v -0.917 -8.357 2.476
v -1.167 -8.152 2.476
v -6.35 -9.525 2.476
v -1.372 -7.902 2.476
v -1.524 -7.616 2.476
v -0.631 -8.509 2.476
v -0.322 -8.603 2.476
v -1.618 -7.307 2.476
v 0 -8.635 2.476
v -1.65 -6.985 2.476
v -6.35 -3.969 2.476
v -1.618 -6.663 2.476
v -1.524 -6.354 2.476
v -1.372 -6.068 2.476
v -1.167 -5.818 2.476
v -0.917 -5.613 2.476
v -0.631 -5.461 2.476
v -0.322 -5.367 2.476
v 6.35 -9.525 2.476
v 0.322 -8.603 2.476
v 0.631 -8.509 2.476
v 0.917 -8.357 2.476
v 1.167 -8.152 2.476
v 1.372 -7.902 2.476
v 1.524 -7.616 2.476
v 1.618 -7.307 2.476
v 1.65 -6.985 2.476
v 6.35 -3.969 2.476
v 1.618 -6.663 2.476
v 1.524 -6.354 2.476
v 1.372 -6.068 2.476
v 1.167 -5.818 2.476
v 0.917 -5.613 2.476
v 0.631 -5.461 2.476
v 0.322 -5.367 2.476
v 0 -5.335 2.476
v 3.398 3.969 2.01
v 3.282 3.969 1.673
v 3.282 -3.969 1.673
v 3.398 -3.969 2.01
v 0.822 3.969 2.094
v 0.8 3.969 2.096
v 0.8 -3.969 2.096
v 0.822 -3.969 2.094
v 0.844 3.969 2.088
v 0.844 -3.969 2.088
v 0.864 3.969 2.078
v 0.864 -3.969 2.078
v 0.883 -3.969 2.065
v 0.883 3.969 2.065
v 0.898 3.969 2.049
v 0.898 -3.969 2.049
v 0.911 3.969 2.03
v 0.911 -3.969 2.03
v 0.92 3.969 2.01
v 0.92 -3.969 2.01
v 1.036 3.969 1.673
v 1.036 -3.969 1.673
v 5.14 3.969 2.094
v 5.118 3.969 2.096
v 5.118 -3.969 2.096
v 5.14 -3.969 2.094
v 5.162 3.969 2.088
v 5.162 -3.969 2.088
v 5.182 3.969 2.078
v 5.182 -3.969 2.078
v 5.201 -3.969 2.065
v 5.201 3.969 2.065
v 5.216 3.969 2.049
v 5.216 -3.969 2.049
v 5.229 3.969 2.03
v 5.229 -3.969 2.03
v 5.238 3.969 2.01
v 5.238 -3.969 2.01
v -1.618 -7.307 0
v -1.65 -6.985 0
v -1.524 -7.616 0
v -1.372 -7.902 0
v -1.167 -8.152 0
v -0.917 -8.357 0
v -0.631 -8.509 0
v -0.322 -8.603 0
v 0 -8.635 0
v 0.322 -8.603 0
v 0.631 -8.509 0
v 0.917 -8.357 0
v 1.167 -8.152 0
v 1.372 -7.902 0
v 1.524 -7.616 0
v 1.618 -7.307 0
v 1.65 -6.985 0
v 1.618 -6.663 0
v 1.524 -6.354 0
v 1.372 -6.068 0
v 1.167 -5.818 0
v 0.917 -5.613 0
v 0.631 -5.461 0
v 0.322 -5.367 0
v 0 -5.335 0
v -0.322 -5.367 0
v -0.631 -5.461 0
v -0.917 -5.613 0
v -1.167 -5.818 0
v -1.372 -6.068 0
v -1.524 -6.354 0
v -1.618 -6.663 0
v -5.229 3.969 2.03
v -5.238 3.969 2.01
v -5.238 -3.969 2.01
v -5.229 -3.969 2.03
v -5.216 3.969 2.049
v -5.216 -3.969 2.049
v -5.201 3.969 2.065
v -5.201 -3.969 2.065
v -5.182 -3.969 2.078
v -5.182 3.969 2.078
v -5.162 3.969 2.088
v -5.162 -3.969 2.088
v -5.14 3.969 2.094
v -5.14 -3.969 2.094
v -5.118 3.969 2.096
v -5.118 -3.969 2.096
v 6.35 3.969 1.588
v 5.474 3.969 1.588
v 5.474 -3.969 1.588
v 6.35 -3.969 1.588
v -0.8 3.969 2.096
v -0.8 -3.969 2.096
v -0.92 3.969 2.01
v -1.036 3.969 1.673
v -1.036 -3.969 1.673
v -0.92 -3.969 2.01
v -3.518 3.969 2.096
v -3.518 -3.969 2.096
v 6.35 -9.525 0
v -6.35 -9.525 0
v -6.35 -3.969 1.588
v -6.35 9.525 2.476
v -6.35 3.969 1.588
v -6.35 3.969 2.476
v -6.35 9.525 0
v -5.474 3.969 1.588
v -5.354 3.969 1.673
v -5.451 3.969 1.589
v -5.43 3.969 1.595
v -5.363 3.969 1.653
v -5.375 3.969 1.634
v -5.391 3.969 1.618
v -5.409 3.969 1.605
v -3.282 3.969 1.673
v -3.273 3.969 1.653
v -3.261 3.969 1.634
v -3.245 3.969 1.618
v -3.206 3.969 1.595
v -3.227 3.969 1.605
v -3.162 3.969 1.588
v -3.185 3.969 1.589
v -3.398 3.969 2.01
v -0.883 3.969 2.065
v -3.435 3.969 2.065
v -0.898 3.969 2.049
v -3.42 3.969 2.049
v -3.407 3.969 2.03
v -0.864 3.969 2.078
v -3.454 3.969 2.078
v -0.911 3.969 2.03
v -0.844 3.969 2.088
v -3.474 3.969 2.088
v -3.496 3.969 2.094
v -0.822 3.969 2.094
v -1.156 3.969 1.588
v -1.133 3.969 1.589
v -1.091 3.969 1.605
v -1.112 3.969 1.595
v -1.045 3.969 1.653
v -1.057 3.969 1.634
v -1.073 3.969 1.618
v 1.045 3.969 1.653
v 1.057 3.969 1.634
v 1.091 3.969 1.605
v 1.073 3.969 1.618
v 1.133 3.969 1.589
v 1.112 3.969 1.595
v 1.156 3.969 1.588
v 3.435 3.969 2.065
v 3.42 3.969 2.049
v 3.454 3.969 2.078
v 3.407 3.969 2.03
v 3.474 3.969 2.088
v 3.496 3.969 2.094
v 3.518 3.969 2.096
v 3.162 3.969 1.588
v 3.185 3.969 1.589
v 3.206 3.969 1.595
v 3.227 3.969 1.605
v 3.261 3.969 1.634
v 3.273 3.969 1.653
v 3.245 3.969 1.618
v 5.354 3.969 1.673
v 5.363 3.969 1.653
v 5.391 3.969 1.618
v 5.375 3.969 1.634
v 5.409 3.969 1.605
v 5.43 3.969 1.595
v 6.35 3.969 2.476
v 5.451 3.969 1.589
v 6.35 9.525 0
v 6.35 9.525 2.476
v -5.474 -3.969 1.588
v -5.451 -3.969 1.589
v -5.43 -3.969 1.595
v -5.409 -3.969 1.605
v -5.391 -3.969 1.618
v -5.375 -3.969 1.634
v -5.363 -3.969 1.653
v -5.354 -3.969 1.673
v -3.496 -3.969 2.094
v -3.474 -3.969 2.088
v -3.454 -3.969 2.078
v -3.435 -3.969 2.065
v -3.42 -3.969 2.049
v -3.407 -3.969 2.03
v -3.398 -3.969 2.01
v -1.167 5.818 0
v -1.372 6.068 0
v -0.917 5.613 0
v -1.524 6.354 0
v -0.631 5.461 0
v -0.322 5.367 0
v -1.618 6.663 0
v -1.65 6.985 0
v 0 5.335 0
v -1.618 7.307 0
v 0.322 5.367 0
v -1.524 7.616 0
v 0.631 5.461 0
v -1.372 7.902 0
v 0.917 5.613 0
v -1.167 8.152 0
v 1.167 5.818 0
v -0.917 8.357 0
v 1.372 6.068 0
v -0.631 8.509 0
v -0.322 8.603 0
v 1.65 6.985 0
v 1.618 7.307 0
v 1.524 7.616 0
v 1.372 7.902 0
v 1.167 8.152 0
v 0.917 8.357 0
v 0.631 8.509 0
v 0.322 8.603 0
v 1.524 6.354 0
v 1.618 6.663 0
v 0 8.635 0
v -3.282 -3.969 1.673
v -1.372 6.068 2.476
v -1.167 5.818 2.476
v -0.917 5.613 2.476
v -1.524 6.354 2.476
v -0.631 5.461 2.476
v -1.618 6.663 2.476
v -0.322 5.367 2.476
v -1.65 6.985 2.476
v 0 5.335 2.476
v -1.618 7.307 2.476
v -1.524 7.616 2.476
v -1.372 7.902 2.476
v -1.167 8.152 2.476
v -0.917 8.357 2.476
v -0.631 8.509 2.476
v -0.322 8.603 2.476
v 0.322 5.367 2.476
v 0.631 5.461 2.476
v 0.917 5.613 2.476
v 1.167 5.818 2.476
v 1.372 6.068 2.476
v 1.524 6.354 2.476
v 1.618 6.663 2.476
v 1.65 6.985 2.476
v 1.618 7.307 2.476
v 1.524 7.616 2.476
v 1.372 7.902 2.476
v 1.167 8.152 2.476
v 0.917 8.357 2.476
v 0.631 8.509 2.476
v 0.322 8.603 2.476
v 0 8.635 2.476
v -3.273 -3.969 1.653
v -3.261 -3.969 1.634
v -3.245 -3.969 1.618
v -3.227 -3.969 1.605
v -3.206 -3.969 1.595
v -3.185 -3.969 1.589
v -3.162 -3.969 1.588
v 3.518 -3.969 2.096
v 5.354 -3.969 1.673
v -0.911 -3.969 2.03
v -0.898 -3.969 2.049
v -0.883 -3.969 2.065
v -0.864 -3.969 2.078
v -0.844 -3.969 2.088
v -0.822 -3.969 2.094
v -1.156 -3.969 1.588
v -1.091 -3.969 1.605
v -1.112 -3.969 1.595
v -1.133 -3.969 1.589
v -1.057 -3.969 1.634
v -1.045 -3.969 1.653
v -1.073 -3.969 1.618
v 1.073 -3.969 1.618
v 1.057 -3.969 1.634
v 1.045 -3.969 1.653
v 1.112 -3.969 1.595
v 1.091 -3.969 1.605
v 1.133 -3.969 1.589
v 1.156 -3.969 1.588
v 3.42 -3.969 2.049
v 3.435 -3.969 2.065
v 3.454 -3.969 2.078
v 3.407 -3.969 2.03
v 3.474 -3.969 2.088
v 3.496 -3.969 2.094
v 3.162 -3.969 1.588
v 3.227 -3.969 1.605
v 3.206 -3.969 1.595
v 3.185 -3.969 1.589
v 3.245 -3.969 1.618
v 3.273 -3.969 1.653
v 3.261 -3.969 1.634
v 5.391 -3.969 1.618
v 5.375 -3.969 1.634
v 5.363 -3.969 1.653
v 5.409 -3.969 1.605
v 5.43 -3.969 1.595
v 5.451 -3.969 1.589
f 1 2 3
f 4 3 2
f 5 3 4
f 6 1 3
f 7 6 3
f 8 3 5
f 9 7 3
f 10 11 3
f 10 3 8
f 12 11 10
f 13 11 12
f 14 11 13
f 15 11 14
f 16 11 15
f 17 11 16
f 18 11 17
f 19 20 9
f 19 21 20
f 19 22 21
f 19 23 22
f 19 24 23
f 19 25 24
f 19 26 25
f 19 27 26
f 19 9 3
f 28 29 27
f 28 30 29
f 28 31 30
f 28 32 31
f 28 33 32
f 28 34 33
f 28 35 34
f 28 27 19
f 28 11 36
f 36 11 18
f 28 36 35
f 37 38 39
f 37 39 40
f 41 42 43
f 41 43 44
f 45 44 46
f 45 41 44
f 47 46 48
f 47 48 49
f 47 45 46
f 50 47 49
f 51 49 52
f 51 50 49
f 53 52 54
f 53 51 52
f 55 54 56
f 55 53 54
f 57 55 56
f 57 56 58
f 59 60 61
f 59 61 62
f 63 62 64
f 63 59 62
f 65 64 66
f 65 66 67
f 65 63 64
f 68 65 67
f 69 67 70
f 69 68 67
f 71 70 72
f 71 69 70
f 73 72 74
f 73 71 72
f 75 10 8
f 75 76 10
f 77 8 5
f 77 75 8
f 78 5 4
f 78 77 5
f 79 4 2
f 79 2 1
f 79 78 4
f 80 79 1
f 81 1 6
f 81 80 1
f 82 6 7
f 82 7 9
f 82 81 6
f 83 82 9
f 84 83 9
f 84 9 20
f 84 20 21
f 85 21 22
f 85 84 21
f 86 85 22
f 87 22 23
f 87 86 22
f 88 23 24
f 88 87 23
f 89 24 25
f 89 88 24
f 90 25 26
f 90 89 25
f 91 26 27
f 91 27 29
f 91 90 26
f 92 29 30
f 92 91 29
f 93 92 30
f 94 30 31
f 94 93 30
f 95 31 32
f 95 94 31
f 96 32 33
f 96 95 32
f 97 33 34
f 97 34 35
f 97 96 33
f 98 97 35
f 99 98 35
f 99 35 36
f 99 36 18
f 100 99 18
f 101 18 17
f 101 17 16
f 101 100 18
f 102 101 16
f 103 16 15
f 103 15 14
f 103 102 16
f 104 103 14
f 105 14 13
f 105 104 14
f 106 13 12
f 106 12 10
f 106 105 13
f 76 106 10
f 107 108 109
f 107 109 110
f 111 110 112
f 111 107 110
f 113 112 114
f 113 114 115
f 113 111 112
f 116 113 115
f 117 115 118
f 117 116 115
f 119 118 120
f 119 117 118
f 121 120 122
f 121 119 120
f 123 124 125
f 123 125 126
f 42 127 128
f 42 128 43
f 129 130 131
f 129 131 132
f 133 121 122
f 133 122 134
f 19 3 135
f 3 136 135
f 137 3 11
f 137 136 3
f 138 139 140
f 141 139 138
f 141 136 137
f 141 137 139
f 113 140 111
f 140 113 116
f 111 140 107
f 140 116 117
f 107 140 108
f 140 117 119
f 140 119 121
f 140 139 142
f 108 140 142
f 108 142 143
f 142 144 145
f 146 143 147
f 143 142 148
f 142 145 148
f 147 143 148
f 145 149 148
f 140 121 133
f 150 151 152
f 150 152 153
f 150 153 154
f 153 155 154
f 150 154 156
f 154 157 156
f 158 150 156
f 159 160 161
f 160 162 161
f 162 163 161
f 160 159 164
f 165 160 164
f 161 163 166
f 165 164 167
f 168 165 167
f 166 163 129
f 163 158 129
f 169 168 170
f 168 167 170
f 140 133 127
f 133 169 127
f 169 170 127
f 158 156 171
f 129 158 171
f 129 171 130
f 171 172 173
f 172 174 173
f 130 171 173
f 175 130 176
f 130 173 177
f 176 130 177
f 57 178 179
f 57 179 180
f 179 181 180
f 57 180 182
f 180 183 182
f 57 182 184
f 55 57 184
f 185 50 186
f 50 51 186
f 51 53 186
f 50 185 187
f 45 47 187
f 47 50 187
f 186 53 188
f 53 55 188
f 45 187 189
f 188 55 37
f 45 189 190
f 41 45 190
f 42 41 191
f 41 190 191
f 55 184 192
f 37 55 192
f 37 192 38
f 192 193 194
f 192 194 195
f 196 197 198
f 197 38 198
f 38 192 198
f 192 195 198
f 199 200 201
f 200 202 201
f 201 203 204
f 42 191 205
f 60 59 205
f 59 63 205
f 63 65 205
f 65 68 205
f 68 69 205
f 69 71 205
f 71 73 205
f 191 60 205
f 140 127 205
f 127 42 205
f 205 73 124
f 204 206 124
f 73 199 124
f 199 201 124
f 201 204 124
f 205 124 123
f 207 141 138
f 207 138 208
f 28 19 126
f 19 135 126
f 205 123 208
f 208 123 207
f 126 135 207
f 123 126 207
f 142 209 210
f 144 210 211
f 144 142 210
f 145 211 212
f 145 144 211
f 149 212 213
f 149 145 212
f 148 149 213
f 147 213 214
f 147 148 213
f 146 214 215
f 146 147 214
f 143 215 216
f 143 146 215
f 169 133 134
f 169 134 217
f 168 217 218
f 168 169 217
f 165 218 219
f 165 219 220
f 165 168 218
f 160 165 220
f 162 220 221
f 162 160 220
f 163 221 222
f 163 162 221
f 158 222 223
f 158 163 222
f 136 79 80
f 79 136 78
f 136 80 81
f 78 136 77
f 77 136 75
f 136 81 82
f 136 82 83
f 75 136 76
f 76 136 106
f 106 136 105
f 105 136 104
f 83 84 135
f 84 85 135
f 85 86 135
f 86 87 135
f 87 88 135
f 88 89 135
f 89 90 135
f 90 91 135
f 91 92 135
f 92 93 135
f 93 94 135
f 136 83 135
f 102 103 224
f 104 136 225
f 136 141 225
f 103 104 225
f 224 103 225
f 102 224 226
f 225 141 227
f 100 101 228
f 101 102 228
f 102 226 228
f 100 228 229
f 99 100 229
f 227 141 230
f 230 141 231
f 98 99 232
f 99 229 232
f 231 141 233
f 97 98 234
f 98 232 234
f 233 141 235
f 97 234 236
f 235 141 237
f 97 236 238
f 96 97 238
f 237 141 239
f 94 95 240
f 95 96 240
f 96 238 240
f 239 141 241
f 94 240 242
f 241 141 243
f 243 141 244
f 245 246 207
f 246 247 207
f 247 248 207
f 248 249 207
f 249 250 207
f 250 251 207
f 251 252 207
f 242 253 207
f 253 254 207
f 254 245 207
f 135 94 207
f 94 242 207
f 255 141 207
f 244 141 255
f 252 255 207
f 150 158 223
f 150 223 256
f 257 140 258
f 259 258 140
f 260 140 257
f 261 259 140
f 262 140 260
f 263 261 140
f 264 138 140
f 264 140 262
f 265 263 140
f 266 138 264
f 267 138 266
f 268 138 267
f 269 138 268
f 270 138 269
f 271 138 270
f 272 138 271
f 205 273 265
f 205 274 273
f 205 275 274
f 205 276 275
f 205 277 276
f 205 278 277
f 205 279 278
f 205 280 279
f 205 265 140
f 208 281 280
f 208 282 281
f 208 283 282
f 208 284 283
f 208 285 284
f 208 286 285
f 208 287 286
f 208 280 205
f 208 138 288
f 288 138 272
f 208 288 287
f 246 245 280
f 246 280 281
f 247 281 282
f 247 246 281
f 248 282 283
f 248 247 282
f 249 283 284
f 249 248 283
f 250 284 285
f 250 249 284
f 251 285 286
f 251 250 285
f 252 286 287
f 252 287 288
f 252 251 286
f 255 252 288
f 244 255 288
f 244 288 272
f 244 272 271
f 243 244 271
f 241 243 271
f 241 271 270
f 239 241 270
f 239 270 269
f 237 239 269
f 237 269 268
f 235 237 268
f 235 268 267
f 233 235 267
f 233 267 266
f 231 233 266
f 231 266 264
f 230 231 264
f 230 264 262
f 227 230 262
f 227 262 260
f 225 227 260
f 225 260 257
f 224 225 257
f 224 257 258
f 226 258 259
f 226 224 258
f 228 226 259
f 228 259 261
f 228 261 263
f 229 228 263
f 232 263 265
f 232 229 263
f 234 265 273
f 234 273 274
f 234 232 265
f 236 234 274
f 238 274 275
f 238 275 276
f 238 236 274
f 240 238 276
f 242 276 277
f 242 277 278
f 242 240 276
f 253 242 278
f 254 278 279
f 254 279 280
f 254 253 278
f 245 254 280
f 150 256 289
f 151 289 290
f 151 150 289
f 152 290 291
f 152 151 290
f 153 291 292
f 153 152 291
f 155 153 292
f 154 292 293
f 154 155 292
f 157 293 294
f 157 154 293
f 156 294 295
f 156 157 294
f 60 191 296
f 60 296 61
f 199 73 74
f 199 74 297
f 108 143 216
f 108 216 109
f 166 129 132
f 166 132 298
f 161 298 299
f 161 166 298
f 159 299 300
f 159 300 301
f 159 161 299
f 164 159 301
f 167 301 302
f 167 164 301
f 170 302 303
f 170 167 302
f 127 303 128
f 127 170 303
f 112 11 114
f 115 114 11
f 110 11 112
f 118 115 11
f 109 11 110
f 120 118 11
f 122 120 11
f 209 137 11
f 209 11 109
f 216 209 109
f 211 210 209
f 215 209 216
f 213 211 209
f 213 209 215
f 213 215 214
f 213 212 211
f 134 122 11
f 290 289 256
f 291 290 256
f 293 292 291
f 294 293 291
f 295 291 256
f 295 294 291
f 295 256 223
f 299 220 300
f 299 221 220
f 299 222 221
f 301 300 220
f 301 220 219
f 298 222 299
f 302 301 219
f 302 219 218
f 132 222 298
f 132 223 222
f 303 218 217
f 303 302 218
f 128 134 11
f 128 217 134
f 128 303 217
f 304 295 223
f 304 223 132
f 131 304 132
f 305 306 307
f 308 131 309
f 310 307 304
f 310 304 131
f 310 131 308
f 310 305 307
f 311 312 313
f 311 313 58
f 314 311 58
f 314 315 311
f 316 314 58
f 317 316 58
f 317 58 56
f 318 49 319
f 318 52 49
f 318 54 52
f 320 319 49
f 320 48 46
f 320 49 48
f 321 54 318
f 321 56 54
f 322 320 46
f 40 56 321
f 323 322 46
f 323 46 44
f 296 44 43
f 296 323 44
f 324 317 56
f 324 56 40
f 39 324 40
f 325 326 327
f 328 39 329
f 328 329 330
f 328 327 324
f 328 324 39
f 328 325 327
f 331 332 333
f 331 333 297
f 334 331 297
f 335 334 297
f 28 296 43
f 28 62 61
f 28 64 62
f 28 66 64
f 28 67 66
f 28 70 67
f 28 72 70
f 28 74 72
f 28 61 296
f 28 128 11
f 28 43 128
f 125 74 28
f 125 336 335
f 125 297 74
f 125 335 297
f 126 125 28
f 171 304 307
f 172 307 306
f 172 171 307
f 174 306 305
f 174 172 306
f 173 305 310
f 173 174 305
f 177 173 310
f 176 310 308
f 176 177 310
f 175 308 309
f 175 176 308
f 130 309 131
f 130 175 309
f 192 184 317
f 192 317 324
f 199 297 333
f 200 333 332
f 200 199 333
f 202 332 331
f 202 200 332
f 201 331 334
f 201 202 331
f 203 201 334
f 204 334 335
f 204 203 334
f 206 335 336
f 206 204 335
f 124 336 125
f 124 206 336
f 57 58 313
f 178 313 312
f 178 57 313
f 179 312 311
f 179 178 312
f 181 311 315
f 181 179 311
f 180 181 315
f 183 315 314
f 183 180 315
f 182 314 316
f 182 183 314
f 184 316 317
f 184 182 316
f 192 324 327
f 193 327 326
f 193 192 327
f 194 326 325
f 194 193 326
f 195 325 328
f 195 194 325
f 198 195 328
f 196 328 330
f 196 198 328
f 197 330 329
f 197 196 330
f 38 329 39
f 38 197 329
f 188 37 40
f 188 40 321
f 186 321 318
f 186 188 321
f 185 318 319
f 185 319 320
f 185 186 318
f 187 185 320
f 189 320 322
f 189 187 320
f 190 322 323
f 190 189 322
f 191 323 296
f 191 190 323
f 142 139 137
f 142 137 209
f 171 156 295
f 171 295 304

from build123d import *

# Parameters (mm, degrees)
SKETCH1_W           = 12.7
SKETCH1_H           = 19.05
SKETCH1_R           = 1.65
BOSS_EXTRUDE1_DEPTH = 1.5875
SKETCH2_W           = 12.7
SKETCH2_H           = 5.55625
SKETCH2_R           = 1.65
BOSS_EXTRUDE2_DEPTH = 0.889
BOSS_EXTRUDE3_REACH = 17.117
LPATTERN1_COUNT     = 2
LPATTERN1_PITCH     = 4.318
LPATTERN1_COL_COUNT = 2
LPATTERN1_COL_PITCH = 4.318


with BuildPart() as part:
    # Sketch1 → Boss-Extrude1 (new body)
    with BuildSketch(Plane.XY):
        Rectangle(SKETCH1_W, SKETCH1_H)
        with Locations((0, 6.985)):
            Circle(SKETCH1_R, mode=Mode.SUBTRACT)
        with Locations(Location((0, -6.985, 0), (0, 0, 180))):
            Circle(SKETCH1_R, mode=Mode.SUBTRACT)
    extrude(amount=BOSS_EXTRUDE1_DEPTH)

    # Sketch2 → Boss-Extrude2 (add)
    # profile 1 of 2: a face of its own
    with BuildSketch(Plane.XY.offset(1.5875)):
        with Locations((0, -6.746875)):
            Rectangle(SKETCH2_W, SKETCH2_H)
        with Locations(Location((0, -6.985, 0), (0, 0, 180))):
            Circle(SKETCH2_R, mode=Mode.SUBTRACT)
    # profile 2 of 2: a face of its own
    with BuildSketch(Plane.XY.offset(1.5875)):
        with Locations((0, 6.746875)):
            Rectangle(SKETCH2_W, SKETCH2_H)
        with Locations((0, 6.985)):
            Circle(SKETCH2_R, mode=Mode.SUBTRACT)
    extrude(amount=BOSS_EXTRUDE2_DEPTH)

    # Sketch3 → Boss-Extrude3 (add, up to next)
    with BuildSketch(Plane.XZ.offset(-3.96875), mode=Mode.PRIVATE) as boss_extrude3_sk1:
        with BuildLine():
            Line((-0.8001, 2.0955), (0.8001, 2.0955))
            ThreePointArc((0.8001, 2.0955), (0.873917251, 2.071844151), (0.920235135, 2.009689189))
            Line((0.920235135, 2.009689189), (1.035564865, 1.673310811))
            ThreePointArc((1.035564865, 1.673310811), (1.081882749, 1.611155849), (1.1557, 1.5875))
            Line((1.1557, 1.5875), (-1.1557, 1.5875))
            ThreePointArc((-1.1557, 1.5875), (-1.081882749, 1.611155849), (-1.035564865, 1.673310811))
            Line((-1.035564865, 1.673310811), (-0.920235135, 2.009689189))
            ThreePointArc((-0.920235135, 2.009689189), (-0.873917251, 2.071844151), (-0.8001, 2.0955))
        make_face()
    boss_extrude3_tool1 = extrude(boss_extrude3_sk1.sketch, amount=BOSS_EXTRUDE3_REACH, mode=Mode.PRIVATE) - part.part
    boss_extrude3 = boss_extrude3_tool1.solids().sort_by_distance((0, 3.96875, 1.832521))[0]
    add(boss_extrude3)

    # LPattern1: Boss-Extrude3 ×2
    with Locations(*[(i * LPATTERN1_PITCH, 0, 0) for i in range(1, LPATTERN1_COUNT)]):
        add(boss_extrude3)

    # LPattern1 col: Boss-Extrude3 ×2
    with Locations(*[(-i * LPATTERN1_COL_PITCH, 0, 0) for i in range(1, LPATTERN1_COL_COUNT)]):
        add(boss_extrude3)


solid = part.part
